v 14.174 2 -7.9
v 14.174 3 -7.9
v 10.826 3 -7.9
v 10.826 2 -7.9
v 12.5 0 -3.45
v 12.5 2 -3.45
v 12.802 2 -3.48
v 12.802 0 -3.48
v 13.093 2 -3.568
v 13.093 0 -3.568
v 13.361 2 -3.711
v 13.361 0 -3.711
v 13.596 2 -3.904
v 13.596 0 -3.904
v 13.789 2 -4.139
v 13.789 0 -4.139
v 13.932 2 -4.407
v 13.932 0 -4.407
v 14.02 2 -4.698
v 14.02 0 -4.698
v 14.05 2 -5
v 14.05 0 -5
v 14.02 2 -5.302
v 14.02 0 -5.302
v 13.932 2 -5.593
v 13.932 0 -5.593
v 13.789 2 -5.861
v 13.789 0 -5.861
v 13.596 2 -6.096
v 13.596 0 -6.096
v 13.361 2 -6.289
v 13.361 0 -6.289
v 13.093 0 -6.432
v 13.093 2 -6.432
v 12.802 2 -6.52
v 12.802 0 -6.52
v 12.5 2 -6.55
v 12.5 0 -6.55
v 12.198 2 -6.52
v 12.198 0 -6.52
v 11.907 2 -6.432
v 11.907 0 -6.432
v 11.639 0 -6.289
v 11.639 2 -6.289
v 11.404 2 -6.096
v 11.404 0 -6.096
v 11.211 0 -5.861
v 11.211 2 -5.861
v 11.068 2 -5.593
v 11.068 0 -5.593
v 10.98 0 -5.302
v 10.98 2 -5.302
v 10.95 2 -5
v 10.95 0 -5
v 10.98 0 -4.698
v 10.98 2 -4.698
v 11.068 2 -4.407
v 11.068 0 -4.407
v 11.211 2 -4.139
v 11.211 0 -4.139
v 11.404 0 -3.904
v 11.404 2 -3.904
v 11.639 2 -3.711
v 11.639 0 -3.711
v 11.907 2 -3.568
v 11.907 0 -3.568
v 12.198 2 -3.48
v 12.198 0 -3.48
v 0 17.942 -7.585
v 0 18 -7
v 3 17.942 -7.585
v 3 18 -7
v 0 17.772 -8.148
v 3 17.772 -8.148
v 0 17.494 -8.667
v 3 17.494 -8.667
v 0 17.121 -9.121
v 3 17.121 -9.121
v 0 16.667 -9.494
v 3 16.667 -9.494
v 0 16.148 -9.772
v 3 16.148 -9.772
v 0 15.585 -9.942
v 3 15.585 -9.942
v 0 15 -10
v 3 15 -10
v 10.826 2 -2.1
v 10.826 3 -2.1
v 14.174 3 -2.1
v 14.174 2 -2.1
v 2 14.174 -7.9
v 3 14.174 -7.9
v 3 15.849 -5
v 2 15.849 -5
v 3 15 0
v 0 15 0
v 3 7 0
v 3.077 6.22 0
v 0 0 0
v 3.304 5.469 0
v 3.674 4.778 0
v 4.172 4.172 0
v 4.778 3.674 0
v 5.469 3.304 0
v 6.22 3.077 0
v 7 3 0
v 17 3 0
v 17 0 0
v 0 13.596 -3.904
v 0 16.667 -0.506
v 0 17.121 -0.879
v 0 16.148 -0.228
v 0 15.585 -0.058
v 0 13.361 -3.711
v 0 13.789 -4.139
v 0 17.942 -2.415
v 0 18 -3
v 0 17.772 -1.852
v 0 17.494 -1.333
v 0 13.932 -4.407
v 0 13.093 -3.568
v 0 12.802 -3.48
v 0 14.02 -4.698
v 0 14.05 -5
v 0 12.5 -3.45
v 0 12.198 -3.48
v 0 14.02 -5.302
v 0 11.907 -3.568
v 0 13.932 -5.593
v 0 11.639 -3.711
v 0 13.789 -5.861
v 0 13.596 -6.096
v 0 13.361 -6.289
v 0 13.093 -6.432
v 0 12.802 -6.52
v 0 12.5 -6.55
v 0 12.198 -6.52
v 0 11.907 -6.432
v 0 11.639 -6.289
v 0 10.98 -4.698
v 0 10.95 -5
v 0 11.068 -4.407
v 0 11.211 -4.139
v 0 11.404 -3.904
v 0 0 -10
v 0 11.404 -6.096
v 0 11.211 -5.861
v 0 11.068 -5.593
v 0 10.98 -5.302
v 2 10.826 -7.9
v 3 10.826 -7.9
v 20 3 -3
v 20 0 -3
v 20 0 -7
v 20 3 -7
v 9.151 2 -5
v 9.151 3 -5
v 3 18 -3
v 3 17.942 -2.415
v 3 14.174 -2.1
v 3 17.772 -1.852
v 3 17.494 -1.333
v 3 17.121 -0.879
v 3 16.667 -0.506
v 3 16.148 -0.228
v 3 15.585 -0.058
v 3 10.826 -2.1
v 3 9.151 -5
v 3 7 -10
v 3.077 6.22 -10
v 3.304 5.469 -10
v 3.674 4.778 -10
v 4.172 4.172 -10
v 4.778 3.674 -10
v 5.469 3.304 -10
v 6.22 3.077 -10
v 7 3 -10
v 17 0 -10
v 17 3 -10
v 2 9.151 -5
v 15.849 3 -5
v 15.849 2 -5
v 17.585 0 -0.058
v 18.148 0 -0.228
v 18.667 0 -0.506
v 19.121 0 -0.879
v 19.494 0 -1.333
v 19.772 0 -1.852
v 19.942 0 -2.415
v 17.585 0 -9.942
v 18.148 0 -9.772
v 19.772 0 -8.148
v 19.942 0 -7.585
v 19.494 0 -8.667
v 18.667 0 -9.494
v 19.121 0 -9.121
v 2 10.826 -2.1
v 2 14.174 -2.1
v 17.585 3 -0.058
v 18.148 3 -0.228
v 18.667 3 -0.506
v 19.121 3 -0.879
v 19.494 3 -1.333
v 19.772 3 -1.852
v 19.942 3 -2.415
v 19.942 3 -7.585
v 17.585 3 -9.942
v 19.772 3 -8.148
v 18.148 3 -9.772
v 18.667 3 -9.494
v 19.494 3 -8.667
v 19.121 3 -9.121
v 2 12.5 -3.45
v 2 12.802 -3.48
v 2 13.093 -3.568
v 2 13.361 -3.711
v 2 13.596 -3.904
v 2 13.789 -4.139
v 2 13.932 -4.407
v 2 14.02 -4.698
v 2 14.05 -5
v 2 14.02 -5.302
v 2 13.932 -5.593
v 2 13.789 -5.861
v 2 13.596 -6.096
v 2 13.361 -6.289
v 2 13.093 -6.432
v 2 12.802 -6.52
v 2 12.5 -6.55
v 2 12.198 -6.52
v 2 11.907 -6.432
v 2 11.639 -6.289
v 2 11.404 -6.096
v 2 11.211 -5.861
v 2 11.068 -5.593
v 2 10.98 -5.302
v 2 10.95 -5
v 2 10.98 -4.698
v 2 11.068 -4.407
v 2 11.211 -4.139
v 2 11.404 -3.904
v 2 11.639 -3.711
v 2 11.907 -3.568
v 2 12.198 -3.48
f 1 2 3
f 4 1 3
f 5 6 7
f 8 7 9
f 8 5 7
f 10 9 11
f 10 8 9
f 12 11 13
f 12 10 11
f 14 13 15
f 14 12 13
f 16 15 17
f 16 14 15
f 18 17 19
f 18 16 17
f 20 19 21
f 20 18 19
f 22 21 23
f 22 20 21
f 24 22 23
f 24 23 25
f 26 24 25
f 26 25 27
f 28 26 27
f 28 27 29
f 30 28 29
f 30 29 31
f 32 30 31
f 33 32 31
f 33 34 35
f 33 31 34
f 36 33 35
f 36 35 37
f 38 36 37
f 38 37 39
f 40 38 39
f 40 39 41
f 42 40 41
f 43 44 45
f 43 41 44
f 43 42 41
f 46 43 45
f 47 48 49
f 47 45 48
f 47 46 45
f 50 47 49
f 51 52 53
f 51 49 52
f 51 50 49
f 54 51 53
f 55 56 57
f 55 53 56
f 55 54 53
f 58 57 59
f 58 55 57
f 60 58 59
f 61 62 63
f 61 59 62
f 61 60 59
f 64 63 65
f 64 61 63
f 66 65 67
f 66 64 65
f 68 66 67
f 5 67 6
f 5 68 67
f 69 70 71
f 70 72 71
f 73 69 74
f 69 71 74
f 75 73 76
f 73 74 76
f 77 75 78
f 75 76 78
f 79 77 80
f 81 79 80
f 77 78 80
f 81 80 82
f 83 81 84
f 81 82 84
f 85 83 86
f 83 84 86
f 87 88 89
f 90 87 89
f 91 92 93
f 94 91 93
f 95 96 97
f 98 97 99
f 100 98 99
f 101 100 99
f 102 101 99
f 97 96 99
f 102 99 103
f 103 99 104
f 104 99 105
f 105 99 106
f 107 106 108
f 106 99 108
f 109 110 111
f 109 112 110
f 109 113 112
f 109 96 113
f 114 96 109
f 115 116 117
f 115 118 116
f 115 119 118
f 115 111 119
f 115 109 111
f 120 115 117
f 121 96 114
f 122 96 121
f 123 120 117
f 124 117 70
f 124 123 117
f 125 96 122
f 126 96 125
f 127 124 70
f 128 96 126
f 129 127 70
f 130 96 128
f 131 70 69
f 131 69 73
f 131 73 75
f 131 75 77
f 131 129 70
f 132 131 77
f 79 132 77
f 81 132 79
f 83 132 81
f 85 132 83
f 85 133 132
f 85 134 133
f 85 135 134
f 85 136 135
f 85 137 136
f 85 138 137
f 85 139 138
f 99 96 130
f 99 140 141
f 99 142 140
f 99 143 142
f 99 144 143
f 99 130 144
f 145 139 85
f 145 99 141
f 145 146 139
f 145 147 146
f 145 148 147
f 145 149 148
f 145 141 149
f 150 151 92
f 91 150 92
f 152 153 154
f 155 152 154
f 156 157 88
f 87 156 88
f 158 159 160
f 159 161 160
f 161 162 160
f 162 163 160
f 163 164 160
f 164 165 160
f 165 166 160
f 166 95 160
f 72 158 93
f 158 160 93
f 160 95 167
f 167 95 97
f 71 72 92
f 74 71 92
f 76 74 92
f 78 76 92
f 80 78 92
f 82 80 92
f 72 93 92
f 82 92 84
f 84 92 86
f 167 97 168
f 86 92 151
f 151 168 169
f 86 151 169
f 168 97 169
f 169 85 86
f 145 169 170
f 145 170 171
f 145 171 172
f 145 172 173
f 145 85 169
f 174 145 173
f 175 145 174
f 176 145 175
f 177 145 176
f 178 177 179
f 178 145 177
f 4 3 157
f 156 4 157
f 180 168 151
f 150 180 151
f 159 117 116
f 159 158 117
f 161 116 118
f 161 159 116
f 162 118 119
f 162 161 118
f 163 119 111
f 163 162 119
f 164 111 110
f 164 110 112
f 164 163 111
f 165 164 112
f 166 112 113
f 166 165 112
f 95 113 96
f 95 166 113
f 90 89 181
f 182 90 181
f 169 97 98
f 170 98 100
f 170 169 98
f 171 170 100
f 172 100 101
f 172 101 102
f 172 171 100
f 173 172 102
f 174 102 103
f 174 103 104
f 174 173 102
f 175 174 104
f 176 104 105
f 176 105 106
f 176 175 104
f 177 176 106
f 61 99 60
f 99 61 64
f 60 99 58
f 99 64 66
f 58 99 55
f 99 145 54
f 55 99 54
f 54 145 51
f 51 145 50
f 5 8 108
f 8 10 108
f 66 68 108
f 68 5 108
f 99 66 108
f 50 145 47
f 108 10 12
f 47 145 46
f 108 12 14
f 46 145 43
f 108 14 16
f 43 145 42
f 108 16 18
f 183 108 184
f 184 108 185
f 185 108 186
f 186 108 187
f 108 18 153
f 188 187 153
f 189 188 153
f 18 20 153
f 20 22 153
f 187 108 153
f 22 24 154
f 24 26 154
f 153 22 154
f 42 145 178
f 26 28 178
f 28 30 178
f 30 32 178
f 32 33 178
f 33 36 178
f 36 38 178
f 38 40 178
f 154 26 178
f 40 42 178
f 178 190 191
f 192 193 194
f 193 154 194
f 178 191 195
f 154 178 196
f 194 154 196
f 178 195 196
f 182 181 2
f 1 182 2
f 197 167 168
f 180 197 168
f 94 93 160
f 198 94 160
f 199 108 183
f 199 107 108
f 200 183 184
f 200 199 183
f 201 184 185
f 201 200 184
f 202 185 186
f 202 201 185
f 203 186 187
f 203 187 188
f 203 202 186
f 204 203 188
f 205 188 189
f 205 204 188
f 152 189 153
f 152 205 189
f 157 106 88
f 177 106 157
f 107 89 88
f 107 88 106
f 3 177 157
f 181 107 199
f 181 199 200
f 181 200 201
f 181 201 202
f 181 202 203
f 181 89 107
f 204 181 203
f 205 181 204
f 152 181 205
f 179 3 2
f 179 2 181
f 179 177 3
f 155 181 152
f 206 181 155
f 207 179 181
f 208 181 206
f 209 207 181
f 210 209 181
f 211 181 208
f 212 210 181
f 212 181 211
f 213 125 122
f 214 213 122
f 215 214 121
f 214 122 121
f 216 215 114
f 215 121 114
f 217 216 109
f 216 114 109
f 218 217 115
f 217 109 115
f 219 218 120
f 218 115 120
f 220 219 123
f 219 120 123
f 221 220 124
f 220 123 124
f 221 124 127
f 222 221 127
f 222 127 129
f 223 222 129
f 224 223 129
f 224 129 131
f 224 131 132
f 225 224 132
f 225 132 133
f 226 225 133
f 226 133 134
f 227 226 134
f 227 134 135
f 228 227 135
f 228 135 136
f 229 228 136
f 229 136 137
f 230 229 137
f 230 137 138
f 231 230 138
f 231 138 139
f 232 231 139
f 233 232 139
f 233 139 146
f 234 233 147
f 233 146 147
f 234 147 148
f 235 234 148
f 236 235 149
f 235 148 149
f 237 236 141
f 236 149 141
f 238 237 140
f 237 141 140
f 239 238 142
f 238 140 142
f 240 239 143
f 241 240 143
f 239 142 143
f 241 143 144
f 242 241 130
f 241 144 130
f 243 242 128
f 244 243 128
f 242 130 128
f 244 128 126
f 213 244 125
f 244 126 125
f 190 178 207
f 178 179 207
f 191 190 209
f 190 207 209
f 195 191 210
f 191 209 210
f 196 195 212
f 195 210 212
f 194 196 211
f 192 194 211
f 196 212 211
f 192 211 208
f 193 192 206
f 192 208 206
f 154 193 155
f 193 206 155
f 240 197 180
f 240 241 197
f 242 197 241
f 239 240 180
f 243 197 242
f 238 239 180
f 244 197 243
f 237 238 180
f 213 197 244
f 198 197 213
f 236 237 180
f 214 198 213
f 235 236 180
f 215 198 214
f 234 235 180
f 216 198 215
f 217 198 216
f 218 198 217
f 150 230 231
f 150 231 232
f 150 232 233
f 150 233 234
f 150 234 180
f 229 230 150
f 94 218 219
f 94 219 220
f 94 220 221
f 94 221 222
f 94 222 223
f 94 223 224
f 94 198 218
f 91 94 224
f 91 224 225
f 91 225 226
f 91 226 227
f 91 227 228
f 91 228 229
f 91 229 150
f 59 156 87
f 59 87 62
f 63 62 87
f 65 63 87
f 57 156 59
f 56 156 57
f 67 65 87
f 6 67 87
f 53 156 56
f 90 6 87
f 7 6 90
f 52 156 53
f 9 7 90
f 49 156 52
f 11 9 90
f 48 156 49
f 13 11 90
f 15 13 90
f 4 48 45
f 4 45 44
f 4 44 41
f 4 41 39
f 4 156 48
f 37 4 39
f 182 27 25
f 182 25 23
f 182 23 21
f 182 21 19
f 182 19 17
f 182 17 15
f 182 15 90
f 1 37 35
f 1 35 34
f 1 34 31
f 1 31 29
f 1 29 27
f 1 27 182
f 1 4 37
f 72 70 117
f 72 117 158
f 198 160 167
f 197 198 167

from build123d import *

# Parameters (mm, degrees)
CROQUIS1_W              = 20
CROQUIS1_H              = 10
CROQUIS1_R              = 1.55
SALIENTE_EXTRUIR1_DEPTH = 3
CROQUIS2_W              = 3
CROQUIS2_H              = 10
SALIENTE_EXTRUIR2_DEPTH = 15
CROQUIS3_R              = 1.55
CORTAR_EXTRUIR1_DEPTH   = 3
CORTAR_EXTRUIR3_DEPTH   = 1
REDONDEO1_R             = 3
REDONDEO2_R             = 4
CORTAR_EXTRUIR4_DEPTH   = 1


with BuildPart() as part:
    # Croquis1 → Saliente-Extruir1 (new body)
    with BuildSketch(Plane(origin=(0, 0, 0), x_dir=(1, 0, 0), z_dir=(0, 1, 0))):
        with Locations((10, 5)):
            Rectangle(CROQUIS1_W, CROQUIS1_H)
        with Locations(Location((12.5, 5, 0), (0, 0, 270))):
            Circle(CROQUIS1_R, mode=Mode.SUBTRACT)
    extrude(amount=SALIENTE_EXTRUIR1_DEPTH)

    # Croquis2 → Saliente-Extruir2 (add)
    with BuildSketch(Plane(origin=(0, 3, 0), x_dir=(1, 0, 0), z_dir=(0, 1, 0))):
        with Locations((1.5, 5)):
            Rectangle(CROQUIS2_W, CROQUIS2_H)
    extrude(amount=SALIENTE_EXTRUIR2_DEPTH)

    # Croquis3 → Cortar-Extruir1 (cut)
    with BuildSketch(Plane.ZY):
        with Locations((-5, 12.5)):
            Circle(CROQUIS3_R)
    extrude(amount=-CORTAR_EXTRUIR1_DEPTH, mode=Mode.SUBTRACT)

    # Croquis5 → Cortar-Extruir3 (cut)
    with BuildSketch(Plane(origin=(3, 0, 0), x_dir=(0, 0, -1), z_dir=(1, 0, 0))):
        Polygon((7.9, 14.174315781), (5, 15.848631561), (2.1, 14.174315781), (2.1, 10.825684219), (5, 9.151368439), (7.9, 10.825684219), align=None)
    extrude(amount=-CORTAR_EXTRUIR3_DEPTH, mode=Mode.SUBTRACT)

    # Redondeo1
    redondeo1_edges = [part.edges().sort_by_distance(p)[0] for p in [
        (1.5, 18, 0),
        (1.5, 18, -10),
        (20, 1.5, -10),
        (20, 1.5, 0),
    ]]
    fillet(redondeo1_edges, radius=REDONDEO1_R)

    # Redondeo2
    redondeo2_edges = [part.edges().sort_by_distance(p)[0] for p in [
        (3, 3, -5),
    ]]
    fillet(redondeo2_edges, radius=REDONDEO2_R)

    # Croquis6 → Cortar-Extruir4 (cut)
    with BuildSketch(Plane(origin=(0, 3, 0), x_dir=(1, 0, 0), z_dir=(0, 1, 0))):
        Polygon((14.174315781, 7.9), (10.825684219, 7.9), (9.151368439, 5), (10.825684219, 2.1), (14.174315781, 2.1), (15.848631561, 5), align=None)
    extrude(amount=-CORTAR_EXTRUIR4_DEPTH, mode=Mode.SUBTRACT)


solid = part.part
